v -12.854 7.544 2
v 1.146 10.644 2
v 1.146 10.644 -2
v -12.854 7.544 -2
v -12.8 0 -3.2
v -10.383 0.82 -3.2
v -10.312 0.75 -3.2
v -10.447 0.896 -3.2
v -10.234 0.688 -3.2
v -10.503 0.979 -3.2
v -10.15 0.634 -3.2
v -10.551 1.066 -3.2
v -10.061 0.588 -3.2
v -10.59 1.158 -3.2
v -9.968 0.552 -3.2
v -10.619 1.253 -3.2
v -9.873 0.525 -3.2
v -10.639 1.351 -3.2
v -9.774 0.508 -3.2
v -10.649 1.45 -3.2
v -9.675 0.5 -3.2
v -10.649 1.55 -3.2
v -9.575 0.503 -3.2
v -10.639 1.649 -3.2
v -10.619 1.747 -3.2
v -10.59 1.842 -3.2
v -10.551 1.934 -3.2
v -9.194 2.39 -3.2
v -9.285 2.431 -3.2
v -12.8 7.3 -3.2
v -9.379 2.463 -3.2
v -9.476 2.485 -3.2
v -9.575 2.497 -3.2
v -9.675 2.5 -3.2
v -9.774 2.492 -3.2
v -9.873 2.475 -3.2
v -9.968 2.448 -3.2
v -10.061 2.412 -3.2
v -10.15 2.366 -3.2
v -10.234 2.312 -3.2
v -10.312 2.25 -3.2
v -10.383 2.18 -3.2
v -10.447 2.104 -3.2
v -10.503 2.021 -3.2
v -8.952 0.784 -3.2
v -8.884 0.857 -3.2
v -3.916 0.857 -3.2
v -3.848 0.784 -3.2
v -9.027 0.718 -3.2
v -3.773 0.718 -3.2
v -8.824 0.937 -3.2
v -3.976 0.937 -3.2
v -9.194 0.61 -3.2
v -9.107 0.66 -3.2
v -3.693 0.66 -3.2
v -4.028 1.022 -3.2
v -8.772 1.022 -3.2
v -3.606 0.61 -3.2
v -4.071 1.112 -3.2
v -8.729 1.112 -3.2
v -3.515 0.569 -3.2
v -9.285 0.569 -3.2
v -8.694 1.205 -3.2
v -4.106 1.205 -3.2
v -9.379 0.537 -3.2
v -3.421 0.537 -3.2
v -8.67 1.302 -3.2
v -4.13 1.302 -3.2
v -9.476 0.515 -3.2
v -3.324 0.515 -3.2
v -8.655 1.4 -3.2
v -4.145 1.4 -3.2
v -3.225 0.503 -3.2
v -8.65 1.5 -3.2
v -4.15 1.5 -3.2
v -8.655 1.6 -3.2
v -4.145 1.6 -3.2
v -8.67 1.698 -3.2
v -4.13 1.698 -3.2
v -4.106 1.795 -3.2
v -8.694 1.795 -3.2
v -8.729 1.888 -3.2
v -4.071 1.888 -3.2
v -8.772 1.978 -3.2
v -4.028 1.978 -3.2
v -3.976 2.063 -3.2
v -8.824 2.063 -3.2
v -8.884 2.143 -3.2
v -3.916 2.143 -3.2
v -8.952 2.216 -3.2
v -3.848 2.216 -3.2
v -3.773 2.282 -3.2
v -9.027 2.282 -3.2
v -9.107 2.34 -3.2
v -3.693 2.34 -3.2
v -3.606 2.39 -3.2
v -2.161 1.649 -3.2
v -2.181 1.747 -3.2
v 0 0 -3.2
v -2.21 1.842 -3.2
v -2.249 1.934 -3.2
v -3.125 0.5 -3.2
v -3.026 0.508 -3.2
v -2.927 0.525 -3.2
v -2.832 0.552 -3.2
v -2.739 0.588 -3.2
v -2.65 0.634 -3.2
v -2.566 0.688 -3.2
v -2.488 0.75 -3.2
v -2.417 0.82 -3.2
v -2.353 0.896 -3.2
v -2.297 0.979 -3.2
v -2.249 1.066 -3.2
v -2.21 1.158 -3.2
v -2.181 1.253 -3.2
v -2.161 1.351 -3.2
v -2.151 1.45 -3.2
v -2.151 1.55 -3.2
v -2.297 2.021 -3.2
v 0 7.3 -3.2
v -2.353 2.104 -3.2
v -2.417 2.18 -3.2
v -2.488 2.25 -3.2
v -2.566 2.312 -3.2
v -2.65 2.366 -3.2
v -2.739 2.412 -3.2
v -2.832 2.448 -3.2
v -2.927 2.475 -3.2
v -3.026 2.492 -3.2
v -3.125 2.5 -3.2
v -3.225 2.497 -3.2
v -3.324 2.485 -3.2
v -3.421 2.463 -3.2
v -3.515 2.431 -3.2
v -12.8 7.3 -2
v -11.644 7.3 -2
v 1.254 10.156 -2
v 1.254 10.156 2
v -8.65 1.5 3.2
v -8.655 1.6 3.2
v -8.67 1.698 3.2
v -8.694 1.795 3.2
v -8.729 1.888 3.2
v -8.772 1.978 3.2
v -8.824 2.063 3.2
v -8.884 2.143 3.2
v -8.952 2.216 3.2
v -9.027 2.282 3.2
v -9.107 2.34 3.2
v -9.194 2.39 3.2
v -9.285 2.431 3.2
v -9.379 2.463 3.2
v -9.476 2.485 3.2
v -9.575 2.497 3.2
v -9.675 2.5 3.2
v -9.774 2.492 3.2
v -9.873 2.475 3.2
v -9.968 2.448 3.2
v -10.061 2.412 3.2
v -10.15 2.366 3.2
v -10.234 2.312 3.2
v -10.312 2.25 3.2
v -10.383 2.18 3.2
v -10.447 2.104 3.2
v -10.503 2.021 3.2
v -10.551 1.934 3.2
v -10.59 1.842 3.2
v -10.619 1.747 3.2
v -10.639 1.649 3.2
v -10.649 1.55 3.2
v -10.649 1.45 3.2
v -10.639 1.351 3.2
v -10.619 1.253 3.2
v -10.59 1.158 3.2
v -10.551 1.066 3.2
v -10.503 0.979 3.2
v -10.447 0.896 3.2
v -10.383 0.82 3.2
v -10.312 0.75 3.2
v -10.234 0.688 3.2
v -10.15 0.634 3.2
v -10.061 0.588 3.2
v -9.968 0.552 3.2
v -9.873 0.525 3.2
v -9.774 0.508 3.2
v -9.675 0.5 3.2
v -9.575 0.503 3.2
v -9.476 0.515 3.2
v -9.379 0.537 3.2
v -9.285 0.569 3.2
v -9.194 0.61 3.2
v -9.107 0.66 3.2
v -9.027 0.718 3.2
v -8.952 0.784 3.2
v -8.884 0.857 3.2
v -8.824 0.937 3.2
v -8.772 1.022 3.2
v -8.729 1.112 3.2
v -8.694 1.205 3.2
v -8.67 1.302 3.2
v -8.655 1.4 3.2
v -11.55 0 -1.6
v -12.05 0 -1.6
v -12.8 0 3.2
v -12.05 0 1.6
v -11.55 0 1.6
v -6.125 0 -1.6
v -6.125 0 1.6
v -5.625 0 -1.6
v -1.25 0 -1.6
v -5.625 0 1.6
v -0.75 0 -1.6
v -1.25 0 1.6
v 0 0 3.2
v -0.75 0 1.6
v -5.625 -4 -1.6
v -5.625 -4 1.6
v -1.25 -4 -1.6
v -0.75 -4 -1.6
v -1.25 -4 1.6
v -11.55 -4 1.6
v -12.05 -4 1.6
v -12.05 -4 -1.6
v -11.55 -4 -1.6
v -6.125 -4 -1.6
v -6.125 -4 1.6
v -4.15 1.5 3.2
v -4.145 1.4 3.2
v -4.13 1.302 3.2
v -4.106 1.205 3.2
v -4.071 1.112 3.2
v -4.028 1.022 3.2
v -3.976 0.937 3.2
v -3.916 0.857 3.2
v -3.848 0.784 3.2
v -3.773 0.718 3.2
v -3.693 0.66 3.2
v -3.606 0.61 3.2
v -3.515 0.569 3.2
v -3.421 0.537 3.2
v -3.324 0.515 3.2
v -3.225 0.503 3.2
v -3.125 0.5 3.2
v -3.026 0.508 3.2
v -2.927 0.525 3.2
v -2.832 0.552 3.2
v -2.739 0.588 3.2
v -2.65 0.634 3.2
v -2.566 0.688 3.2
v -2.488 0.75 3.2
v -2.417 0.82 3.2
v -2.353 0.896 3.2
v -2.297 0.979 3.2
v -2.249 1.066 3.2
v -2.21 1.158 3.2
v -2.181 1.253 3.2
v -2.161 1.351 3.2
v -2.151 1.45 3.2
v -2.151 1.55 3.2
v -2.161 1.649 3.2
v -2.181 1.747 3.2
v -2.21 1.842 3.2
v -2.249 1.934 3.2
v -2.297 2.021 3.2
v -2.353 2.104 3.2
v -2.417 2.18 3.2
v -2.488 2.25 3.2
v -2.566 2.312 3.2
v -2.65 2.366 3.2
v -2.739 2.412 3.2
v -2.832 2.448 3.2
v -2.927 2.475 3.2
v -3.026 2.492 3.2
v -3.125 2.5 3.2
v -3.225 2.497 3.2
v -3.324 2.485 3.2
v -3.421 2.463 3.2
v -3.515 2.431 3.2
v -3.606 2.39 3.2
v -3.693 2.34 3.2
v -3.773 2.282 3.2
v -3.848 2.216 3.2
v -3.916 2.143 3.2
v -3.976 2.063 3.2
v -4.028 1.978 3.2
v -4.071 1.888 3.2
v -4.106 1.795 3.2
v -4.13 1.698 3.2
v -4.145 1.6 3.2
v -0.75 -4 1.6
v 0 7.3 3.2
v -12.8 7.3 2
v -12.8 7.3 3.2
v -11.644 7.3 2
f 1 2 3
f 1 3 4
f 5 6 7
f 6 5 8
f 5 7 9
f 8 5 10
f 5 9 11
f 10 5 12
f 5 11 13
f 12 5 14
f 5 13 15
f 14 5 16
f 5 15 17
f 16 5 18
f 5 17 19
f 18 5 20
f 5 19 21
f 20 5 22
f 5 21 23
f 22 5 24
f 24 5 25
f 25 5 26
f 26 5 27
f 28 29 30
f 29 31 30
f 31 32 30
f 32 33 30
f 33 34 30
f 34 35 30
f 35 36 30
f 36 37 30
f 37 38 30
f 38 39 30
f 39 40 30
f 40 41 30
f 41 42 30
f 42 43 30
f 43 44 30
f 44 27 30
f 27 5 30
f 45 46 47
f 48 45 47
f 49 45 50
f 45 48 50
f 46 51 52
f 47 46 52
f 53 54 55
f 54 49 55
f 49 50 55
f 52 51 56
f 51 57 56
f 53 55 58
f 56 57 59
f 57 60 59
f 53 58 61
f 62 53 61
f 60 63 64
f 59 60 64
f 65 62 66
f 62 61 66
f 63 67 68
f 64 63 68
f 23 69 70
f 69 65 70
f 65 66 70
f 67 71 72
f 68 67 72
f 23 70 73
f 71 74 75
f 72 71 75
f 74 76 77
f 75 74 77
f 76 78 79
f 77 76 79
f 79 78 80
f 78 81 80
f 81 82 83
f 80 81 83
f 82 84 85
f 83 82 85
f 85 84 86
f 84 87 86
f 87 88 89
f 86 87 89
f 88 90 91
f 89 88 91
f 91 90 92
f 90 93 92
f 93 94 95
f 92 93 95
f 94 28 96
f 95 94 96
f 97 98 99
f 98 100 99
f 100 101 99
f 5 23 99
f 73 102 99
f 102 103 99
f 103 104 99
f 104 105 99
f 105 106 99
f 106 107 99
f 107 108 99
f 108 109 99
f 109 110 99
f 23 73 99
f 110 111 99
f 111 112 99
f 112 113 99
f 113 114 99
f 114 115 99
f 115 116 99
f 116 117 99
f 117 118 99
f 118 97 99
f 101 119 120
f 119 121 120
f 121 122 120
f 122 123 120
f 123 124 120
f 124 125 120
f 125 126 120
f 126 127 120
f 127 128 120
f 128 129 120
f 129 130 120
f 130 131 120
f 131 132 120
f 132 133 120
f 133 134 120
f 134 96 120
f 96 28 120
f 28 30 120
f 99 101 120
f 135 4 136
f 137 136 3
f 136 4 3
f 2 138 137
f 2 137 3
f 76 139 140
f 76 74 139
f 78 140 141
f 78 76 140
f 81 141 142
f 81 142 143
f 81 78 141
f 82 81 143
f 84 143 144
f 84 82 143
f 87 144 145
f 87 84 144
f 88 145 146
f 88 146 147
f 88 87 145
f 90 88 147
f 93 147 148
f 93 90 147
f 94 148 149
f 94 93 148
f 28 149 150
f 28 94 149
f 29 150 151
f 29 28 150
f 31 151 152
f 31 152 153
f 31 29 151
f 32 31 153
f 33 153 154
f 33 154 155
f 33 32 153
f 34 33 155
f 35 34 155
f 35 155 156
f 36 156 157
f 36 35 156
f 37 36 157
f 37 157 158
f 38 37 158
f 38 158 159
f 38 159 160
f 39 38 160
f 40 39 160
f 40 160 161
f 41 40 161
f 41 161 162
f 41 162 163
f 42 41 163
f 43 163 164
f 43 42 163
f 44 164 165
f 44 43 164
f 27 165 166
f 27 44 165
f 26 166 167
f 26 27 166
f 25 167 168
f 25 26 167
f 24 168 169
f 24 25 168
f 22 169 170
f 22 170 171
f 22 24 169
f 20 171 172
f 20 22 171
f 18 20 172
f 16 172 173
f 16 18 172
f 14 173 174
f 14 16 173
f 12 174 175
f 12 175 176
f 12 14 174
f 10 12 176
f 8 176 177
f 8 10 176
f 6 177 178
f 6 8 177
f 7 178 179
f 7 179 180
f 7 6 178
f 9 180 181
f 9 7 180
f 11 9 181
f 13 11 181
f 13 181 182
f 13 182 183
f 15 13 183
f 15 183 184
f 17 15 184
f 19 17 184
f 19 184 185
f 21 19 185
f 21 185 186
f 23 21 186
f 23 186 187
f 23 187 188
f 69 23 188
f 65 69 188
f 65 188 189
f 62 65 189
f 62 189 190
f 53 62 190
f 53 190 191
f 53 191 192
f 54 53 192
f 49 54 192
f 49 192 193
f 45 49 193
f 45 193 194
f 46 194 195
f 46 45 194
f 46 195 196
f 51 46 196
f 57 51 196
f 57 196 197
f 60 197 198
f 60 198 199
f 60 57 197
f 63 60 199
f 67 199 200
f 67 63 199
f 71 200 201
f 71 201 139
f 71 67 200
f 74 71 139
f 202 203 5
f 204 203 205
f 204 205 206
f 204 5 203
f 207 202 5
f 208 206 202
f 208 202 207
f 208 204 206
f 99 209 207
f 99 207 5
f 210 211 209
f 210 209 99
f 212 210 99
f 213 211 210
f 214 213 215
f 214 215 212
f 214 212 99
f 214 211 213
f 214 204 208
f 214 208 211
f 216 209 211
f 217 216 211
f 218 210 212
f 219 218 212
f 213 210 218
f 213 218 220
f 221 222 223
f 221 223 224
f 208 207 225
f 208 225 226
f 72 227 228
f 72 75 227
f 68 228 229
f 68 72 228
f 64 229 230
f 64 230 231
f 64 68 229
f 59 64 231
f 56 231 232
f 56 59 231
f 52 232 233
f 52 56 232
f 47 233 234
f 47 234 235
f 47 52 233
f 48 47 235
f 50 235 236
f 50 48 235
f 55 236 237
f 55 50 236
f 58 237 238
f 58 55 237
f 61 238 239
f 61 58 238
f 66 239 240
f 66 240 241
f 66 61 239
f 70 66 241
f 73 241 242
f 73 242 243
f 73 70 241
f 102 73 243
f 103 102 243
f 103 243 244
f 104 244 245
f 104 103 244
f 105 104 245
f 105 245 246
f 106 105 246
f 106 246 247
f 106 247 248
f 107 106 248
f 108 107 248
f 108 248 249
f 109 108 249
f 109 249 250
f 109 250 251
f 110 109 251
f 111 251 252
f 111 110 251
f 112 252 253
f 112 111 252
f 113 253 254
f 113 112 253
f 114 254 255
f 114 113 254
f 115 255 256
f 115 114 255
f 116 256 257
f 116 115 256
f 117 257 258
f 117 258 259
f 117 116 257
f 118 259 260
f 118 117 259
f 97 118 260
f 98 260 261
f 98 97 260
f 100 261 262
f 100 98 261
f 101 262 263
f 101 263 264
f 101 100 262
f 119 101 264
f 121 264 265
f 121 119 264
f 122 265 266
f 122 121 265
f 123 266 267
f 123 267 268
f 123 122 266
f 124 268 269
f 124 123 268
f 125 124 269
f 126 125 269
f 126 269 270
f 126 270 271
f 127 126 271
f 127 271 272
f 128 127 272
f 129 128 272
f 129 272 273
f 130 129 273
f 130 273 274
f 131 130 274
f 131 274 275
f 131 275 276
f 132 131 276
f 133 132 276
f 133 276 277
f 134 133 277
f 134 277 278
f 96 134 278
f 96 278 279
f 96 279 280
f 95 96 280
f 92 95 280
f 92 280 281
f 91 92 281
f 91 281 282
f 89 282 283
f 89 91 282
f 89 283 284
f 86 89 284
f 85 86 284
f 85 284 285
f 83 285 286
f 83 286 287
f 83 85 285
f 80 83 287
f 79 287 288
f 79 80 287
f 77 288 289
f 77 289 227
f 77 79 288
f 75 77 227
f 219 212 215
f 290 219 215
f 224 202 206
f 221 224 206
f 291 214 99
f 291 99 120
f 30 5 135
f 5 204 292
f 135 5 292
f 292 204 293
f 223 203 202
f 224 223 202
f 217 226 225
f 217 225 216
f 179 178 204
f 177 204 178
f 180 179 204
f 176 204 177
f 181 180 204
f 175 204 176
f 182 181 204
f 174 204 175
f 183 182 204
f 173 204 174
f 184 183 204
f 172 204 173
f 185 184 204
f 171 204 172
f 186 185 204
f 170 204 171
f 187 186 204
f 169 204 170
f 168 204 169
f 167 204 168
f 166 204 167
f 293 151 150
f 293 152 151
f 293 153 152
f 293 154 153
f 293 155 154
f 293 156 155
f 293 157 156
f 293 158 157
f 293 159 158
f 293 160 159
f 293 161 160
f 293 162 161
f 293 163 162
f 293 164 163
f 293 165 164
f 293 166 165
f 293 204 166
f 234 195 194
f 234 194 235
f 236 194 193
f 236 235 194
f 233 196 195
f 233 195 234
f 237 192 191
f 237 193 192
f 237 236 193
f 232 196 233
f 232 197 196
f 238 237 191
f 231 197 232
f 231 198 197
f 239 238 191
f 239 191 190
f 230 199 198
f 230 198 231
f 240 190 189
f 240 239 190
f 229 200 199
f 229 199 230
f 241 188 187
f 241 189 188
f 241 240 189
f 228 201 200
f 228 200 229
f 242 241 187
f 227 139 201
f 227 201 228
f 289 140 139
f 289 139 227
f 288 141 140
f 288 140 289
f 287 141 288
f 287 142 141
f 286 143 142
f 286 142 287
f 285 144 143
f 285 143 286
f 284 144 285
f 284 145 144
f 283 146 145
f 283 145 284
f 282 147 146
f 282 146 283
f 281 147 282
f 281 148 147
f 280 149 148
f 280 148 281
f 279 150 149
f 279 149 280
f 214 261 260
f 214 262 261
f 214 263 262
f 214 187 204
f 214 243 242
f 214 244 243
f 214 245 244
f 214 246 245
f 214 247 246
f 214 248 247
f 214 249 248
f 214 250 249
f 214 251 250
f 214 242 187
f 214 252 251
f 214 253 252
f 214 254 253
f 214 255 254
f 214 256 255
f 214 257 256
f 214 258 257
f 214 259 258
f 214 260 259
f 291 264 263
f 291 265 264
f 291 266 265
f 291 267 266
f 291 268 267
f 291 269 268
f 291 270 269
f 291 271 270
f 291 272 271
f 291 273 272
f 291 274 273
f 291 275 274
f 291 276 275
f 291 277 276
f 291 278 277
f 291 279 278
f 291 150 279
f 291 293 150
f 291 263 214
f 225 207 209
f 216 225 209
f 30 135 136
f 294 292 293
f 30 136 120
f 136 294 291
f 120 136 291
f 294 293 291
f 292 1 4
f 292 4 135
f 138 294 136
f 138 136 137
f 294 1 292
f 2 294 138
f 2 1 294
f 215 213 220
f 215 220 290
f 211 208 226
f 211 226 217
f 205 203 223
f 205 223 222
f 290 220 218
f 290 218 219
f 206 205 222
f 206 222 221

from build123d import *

# Parameters (mm, degrees)
SKETCH_1_W        = 12.8
SKETCH_1_H        = 7.3
SKETCH_1_R        = 1
EXTRUDE_1_DEPTH   = 3.2
SKETCH_2_W        = 0.5
SKETCH_2_H        = 3.2
EXTRUDE_1_2_DEPTH = 4
EXTRUDE_2_DEPTH   = 2


with BuildPart() as part:
    # Эскиз1 → Extrude 1 (new, symmetric)
    with BuildSketch(Plane.XY):
        with Locations((-6.4, 3.65)):
            Rectangle(SKETCH_1_W, SKETCH_1_H)
        with Locations((-9.65, 1.5)):
            Circle(SKETCH_1_R, mode=Mode.SUBTRACT)
        with Locations(Location((-3.15, 1.5, 0), (0, 0, 180))):
            Circle(SKETCH_1_R, mode=Mode.SUBTRACT)
    extrude(amount=EXTRUDE_1_DEPTH, both=True)

    # Эскиз2 → Extrude 1 2 (add)
    with BuildSketch(Plane.XZ):
        with Locations((-11.8, 0)):
            Rectangle(SKETCH_2_W, SKETCH_2_H)
        with Locations((-5.874787357, 0)):
            Rectangle(SKETCH_2_W, SKETCH_2_H)
        with Locations((-1, 0)):
            Rectangle(SKETCH_2_W, SKETCH_2_H)
    extrude(amount=EXTRUDE_1_2_DEPTH)

    # Эскиз3 → Вытянуть-Тонкостенный2 (add, symmetric)
    with BuildSketch(Plane.XY):
        Polygon((-12.745952005, 7.055912282), (1.254047995, 10.155912282), (1.145952005, 10.644087718), (-12.854047995, 7.544087718), align=None)
    extrude(amount=EXTRUDE_2_DEPTH, both=True)


solid = part.part
